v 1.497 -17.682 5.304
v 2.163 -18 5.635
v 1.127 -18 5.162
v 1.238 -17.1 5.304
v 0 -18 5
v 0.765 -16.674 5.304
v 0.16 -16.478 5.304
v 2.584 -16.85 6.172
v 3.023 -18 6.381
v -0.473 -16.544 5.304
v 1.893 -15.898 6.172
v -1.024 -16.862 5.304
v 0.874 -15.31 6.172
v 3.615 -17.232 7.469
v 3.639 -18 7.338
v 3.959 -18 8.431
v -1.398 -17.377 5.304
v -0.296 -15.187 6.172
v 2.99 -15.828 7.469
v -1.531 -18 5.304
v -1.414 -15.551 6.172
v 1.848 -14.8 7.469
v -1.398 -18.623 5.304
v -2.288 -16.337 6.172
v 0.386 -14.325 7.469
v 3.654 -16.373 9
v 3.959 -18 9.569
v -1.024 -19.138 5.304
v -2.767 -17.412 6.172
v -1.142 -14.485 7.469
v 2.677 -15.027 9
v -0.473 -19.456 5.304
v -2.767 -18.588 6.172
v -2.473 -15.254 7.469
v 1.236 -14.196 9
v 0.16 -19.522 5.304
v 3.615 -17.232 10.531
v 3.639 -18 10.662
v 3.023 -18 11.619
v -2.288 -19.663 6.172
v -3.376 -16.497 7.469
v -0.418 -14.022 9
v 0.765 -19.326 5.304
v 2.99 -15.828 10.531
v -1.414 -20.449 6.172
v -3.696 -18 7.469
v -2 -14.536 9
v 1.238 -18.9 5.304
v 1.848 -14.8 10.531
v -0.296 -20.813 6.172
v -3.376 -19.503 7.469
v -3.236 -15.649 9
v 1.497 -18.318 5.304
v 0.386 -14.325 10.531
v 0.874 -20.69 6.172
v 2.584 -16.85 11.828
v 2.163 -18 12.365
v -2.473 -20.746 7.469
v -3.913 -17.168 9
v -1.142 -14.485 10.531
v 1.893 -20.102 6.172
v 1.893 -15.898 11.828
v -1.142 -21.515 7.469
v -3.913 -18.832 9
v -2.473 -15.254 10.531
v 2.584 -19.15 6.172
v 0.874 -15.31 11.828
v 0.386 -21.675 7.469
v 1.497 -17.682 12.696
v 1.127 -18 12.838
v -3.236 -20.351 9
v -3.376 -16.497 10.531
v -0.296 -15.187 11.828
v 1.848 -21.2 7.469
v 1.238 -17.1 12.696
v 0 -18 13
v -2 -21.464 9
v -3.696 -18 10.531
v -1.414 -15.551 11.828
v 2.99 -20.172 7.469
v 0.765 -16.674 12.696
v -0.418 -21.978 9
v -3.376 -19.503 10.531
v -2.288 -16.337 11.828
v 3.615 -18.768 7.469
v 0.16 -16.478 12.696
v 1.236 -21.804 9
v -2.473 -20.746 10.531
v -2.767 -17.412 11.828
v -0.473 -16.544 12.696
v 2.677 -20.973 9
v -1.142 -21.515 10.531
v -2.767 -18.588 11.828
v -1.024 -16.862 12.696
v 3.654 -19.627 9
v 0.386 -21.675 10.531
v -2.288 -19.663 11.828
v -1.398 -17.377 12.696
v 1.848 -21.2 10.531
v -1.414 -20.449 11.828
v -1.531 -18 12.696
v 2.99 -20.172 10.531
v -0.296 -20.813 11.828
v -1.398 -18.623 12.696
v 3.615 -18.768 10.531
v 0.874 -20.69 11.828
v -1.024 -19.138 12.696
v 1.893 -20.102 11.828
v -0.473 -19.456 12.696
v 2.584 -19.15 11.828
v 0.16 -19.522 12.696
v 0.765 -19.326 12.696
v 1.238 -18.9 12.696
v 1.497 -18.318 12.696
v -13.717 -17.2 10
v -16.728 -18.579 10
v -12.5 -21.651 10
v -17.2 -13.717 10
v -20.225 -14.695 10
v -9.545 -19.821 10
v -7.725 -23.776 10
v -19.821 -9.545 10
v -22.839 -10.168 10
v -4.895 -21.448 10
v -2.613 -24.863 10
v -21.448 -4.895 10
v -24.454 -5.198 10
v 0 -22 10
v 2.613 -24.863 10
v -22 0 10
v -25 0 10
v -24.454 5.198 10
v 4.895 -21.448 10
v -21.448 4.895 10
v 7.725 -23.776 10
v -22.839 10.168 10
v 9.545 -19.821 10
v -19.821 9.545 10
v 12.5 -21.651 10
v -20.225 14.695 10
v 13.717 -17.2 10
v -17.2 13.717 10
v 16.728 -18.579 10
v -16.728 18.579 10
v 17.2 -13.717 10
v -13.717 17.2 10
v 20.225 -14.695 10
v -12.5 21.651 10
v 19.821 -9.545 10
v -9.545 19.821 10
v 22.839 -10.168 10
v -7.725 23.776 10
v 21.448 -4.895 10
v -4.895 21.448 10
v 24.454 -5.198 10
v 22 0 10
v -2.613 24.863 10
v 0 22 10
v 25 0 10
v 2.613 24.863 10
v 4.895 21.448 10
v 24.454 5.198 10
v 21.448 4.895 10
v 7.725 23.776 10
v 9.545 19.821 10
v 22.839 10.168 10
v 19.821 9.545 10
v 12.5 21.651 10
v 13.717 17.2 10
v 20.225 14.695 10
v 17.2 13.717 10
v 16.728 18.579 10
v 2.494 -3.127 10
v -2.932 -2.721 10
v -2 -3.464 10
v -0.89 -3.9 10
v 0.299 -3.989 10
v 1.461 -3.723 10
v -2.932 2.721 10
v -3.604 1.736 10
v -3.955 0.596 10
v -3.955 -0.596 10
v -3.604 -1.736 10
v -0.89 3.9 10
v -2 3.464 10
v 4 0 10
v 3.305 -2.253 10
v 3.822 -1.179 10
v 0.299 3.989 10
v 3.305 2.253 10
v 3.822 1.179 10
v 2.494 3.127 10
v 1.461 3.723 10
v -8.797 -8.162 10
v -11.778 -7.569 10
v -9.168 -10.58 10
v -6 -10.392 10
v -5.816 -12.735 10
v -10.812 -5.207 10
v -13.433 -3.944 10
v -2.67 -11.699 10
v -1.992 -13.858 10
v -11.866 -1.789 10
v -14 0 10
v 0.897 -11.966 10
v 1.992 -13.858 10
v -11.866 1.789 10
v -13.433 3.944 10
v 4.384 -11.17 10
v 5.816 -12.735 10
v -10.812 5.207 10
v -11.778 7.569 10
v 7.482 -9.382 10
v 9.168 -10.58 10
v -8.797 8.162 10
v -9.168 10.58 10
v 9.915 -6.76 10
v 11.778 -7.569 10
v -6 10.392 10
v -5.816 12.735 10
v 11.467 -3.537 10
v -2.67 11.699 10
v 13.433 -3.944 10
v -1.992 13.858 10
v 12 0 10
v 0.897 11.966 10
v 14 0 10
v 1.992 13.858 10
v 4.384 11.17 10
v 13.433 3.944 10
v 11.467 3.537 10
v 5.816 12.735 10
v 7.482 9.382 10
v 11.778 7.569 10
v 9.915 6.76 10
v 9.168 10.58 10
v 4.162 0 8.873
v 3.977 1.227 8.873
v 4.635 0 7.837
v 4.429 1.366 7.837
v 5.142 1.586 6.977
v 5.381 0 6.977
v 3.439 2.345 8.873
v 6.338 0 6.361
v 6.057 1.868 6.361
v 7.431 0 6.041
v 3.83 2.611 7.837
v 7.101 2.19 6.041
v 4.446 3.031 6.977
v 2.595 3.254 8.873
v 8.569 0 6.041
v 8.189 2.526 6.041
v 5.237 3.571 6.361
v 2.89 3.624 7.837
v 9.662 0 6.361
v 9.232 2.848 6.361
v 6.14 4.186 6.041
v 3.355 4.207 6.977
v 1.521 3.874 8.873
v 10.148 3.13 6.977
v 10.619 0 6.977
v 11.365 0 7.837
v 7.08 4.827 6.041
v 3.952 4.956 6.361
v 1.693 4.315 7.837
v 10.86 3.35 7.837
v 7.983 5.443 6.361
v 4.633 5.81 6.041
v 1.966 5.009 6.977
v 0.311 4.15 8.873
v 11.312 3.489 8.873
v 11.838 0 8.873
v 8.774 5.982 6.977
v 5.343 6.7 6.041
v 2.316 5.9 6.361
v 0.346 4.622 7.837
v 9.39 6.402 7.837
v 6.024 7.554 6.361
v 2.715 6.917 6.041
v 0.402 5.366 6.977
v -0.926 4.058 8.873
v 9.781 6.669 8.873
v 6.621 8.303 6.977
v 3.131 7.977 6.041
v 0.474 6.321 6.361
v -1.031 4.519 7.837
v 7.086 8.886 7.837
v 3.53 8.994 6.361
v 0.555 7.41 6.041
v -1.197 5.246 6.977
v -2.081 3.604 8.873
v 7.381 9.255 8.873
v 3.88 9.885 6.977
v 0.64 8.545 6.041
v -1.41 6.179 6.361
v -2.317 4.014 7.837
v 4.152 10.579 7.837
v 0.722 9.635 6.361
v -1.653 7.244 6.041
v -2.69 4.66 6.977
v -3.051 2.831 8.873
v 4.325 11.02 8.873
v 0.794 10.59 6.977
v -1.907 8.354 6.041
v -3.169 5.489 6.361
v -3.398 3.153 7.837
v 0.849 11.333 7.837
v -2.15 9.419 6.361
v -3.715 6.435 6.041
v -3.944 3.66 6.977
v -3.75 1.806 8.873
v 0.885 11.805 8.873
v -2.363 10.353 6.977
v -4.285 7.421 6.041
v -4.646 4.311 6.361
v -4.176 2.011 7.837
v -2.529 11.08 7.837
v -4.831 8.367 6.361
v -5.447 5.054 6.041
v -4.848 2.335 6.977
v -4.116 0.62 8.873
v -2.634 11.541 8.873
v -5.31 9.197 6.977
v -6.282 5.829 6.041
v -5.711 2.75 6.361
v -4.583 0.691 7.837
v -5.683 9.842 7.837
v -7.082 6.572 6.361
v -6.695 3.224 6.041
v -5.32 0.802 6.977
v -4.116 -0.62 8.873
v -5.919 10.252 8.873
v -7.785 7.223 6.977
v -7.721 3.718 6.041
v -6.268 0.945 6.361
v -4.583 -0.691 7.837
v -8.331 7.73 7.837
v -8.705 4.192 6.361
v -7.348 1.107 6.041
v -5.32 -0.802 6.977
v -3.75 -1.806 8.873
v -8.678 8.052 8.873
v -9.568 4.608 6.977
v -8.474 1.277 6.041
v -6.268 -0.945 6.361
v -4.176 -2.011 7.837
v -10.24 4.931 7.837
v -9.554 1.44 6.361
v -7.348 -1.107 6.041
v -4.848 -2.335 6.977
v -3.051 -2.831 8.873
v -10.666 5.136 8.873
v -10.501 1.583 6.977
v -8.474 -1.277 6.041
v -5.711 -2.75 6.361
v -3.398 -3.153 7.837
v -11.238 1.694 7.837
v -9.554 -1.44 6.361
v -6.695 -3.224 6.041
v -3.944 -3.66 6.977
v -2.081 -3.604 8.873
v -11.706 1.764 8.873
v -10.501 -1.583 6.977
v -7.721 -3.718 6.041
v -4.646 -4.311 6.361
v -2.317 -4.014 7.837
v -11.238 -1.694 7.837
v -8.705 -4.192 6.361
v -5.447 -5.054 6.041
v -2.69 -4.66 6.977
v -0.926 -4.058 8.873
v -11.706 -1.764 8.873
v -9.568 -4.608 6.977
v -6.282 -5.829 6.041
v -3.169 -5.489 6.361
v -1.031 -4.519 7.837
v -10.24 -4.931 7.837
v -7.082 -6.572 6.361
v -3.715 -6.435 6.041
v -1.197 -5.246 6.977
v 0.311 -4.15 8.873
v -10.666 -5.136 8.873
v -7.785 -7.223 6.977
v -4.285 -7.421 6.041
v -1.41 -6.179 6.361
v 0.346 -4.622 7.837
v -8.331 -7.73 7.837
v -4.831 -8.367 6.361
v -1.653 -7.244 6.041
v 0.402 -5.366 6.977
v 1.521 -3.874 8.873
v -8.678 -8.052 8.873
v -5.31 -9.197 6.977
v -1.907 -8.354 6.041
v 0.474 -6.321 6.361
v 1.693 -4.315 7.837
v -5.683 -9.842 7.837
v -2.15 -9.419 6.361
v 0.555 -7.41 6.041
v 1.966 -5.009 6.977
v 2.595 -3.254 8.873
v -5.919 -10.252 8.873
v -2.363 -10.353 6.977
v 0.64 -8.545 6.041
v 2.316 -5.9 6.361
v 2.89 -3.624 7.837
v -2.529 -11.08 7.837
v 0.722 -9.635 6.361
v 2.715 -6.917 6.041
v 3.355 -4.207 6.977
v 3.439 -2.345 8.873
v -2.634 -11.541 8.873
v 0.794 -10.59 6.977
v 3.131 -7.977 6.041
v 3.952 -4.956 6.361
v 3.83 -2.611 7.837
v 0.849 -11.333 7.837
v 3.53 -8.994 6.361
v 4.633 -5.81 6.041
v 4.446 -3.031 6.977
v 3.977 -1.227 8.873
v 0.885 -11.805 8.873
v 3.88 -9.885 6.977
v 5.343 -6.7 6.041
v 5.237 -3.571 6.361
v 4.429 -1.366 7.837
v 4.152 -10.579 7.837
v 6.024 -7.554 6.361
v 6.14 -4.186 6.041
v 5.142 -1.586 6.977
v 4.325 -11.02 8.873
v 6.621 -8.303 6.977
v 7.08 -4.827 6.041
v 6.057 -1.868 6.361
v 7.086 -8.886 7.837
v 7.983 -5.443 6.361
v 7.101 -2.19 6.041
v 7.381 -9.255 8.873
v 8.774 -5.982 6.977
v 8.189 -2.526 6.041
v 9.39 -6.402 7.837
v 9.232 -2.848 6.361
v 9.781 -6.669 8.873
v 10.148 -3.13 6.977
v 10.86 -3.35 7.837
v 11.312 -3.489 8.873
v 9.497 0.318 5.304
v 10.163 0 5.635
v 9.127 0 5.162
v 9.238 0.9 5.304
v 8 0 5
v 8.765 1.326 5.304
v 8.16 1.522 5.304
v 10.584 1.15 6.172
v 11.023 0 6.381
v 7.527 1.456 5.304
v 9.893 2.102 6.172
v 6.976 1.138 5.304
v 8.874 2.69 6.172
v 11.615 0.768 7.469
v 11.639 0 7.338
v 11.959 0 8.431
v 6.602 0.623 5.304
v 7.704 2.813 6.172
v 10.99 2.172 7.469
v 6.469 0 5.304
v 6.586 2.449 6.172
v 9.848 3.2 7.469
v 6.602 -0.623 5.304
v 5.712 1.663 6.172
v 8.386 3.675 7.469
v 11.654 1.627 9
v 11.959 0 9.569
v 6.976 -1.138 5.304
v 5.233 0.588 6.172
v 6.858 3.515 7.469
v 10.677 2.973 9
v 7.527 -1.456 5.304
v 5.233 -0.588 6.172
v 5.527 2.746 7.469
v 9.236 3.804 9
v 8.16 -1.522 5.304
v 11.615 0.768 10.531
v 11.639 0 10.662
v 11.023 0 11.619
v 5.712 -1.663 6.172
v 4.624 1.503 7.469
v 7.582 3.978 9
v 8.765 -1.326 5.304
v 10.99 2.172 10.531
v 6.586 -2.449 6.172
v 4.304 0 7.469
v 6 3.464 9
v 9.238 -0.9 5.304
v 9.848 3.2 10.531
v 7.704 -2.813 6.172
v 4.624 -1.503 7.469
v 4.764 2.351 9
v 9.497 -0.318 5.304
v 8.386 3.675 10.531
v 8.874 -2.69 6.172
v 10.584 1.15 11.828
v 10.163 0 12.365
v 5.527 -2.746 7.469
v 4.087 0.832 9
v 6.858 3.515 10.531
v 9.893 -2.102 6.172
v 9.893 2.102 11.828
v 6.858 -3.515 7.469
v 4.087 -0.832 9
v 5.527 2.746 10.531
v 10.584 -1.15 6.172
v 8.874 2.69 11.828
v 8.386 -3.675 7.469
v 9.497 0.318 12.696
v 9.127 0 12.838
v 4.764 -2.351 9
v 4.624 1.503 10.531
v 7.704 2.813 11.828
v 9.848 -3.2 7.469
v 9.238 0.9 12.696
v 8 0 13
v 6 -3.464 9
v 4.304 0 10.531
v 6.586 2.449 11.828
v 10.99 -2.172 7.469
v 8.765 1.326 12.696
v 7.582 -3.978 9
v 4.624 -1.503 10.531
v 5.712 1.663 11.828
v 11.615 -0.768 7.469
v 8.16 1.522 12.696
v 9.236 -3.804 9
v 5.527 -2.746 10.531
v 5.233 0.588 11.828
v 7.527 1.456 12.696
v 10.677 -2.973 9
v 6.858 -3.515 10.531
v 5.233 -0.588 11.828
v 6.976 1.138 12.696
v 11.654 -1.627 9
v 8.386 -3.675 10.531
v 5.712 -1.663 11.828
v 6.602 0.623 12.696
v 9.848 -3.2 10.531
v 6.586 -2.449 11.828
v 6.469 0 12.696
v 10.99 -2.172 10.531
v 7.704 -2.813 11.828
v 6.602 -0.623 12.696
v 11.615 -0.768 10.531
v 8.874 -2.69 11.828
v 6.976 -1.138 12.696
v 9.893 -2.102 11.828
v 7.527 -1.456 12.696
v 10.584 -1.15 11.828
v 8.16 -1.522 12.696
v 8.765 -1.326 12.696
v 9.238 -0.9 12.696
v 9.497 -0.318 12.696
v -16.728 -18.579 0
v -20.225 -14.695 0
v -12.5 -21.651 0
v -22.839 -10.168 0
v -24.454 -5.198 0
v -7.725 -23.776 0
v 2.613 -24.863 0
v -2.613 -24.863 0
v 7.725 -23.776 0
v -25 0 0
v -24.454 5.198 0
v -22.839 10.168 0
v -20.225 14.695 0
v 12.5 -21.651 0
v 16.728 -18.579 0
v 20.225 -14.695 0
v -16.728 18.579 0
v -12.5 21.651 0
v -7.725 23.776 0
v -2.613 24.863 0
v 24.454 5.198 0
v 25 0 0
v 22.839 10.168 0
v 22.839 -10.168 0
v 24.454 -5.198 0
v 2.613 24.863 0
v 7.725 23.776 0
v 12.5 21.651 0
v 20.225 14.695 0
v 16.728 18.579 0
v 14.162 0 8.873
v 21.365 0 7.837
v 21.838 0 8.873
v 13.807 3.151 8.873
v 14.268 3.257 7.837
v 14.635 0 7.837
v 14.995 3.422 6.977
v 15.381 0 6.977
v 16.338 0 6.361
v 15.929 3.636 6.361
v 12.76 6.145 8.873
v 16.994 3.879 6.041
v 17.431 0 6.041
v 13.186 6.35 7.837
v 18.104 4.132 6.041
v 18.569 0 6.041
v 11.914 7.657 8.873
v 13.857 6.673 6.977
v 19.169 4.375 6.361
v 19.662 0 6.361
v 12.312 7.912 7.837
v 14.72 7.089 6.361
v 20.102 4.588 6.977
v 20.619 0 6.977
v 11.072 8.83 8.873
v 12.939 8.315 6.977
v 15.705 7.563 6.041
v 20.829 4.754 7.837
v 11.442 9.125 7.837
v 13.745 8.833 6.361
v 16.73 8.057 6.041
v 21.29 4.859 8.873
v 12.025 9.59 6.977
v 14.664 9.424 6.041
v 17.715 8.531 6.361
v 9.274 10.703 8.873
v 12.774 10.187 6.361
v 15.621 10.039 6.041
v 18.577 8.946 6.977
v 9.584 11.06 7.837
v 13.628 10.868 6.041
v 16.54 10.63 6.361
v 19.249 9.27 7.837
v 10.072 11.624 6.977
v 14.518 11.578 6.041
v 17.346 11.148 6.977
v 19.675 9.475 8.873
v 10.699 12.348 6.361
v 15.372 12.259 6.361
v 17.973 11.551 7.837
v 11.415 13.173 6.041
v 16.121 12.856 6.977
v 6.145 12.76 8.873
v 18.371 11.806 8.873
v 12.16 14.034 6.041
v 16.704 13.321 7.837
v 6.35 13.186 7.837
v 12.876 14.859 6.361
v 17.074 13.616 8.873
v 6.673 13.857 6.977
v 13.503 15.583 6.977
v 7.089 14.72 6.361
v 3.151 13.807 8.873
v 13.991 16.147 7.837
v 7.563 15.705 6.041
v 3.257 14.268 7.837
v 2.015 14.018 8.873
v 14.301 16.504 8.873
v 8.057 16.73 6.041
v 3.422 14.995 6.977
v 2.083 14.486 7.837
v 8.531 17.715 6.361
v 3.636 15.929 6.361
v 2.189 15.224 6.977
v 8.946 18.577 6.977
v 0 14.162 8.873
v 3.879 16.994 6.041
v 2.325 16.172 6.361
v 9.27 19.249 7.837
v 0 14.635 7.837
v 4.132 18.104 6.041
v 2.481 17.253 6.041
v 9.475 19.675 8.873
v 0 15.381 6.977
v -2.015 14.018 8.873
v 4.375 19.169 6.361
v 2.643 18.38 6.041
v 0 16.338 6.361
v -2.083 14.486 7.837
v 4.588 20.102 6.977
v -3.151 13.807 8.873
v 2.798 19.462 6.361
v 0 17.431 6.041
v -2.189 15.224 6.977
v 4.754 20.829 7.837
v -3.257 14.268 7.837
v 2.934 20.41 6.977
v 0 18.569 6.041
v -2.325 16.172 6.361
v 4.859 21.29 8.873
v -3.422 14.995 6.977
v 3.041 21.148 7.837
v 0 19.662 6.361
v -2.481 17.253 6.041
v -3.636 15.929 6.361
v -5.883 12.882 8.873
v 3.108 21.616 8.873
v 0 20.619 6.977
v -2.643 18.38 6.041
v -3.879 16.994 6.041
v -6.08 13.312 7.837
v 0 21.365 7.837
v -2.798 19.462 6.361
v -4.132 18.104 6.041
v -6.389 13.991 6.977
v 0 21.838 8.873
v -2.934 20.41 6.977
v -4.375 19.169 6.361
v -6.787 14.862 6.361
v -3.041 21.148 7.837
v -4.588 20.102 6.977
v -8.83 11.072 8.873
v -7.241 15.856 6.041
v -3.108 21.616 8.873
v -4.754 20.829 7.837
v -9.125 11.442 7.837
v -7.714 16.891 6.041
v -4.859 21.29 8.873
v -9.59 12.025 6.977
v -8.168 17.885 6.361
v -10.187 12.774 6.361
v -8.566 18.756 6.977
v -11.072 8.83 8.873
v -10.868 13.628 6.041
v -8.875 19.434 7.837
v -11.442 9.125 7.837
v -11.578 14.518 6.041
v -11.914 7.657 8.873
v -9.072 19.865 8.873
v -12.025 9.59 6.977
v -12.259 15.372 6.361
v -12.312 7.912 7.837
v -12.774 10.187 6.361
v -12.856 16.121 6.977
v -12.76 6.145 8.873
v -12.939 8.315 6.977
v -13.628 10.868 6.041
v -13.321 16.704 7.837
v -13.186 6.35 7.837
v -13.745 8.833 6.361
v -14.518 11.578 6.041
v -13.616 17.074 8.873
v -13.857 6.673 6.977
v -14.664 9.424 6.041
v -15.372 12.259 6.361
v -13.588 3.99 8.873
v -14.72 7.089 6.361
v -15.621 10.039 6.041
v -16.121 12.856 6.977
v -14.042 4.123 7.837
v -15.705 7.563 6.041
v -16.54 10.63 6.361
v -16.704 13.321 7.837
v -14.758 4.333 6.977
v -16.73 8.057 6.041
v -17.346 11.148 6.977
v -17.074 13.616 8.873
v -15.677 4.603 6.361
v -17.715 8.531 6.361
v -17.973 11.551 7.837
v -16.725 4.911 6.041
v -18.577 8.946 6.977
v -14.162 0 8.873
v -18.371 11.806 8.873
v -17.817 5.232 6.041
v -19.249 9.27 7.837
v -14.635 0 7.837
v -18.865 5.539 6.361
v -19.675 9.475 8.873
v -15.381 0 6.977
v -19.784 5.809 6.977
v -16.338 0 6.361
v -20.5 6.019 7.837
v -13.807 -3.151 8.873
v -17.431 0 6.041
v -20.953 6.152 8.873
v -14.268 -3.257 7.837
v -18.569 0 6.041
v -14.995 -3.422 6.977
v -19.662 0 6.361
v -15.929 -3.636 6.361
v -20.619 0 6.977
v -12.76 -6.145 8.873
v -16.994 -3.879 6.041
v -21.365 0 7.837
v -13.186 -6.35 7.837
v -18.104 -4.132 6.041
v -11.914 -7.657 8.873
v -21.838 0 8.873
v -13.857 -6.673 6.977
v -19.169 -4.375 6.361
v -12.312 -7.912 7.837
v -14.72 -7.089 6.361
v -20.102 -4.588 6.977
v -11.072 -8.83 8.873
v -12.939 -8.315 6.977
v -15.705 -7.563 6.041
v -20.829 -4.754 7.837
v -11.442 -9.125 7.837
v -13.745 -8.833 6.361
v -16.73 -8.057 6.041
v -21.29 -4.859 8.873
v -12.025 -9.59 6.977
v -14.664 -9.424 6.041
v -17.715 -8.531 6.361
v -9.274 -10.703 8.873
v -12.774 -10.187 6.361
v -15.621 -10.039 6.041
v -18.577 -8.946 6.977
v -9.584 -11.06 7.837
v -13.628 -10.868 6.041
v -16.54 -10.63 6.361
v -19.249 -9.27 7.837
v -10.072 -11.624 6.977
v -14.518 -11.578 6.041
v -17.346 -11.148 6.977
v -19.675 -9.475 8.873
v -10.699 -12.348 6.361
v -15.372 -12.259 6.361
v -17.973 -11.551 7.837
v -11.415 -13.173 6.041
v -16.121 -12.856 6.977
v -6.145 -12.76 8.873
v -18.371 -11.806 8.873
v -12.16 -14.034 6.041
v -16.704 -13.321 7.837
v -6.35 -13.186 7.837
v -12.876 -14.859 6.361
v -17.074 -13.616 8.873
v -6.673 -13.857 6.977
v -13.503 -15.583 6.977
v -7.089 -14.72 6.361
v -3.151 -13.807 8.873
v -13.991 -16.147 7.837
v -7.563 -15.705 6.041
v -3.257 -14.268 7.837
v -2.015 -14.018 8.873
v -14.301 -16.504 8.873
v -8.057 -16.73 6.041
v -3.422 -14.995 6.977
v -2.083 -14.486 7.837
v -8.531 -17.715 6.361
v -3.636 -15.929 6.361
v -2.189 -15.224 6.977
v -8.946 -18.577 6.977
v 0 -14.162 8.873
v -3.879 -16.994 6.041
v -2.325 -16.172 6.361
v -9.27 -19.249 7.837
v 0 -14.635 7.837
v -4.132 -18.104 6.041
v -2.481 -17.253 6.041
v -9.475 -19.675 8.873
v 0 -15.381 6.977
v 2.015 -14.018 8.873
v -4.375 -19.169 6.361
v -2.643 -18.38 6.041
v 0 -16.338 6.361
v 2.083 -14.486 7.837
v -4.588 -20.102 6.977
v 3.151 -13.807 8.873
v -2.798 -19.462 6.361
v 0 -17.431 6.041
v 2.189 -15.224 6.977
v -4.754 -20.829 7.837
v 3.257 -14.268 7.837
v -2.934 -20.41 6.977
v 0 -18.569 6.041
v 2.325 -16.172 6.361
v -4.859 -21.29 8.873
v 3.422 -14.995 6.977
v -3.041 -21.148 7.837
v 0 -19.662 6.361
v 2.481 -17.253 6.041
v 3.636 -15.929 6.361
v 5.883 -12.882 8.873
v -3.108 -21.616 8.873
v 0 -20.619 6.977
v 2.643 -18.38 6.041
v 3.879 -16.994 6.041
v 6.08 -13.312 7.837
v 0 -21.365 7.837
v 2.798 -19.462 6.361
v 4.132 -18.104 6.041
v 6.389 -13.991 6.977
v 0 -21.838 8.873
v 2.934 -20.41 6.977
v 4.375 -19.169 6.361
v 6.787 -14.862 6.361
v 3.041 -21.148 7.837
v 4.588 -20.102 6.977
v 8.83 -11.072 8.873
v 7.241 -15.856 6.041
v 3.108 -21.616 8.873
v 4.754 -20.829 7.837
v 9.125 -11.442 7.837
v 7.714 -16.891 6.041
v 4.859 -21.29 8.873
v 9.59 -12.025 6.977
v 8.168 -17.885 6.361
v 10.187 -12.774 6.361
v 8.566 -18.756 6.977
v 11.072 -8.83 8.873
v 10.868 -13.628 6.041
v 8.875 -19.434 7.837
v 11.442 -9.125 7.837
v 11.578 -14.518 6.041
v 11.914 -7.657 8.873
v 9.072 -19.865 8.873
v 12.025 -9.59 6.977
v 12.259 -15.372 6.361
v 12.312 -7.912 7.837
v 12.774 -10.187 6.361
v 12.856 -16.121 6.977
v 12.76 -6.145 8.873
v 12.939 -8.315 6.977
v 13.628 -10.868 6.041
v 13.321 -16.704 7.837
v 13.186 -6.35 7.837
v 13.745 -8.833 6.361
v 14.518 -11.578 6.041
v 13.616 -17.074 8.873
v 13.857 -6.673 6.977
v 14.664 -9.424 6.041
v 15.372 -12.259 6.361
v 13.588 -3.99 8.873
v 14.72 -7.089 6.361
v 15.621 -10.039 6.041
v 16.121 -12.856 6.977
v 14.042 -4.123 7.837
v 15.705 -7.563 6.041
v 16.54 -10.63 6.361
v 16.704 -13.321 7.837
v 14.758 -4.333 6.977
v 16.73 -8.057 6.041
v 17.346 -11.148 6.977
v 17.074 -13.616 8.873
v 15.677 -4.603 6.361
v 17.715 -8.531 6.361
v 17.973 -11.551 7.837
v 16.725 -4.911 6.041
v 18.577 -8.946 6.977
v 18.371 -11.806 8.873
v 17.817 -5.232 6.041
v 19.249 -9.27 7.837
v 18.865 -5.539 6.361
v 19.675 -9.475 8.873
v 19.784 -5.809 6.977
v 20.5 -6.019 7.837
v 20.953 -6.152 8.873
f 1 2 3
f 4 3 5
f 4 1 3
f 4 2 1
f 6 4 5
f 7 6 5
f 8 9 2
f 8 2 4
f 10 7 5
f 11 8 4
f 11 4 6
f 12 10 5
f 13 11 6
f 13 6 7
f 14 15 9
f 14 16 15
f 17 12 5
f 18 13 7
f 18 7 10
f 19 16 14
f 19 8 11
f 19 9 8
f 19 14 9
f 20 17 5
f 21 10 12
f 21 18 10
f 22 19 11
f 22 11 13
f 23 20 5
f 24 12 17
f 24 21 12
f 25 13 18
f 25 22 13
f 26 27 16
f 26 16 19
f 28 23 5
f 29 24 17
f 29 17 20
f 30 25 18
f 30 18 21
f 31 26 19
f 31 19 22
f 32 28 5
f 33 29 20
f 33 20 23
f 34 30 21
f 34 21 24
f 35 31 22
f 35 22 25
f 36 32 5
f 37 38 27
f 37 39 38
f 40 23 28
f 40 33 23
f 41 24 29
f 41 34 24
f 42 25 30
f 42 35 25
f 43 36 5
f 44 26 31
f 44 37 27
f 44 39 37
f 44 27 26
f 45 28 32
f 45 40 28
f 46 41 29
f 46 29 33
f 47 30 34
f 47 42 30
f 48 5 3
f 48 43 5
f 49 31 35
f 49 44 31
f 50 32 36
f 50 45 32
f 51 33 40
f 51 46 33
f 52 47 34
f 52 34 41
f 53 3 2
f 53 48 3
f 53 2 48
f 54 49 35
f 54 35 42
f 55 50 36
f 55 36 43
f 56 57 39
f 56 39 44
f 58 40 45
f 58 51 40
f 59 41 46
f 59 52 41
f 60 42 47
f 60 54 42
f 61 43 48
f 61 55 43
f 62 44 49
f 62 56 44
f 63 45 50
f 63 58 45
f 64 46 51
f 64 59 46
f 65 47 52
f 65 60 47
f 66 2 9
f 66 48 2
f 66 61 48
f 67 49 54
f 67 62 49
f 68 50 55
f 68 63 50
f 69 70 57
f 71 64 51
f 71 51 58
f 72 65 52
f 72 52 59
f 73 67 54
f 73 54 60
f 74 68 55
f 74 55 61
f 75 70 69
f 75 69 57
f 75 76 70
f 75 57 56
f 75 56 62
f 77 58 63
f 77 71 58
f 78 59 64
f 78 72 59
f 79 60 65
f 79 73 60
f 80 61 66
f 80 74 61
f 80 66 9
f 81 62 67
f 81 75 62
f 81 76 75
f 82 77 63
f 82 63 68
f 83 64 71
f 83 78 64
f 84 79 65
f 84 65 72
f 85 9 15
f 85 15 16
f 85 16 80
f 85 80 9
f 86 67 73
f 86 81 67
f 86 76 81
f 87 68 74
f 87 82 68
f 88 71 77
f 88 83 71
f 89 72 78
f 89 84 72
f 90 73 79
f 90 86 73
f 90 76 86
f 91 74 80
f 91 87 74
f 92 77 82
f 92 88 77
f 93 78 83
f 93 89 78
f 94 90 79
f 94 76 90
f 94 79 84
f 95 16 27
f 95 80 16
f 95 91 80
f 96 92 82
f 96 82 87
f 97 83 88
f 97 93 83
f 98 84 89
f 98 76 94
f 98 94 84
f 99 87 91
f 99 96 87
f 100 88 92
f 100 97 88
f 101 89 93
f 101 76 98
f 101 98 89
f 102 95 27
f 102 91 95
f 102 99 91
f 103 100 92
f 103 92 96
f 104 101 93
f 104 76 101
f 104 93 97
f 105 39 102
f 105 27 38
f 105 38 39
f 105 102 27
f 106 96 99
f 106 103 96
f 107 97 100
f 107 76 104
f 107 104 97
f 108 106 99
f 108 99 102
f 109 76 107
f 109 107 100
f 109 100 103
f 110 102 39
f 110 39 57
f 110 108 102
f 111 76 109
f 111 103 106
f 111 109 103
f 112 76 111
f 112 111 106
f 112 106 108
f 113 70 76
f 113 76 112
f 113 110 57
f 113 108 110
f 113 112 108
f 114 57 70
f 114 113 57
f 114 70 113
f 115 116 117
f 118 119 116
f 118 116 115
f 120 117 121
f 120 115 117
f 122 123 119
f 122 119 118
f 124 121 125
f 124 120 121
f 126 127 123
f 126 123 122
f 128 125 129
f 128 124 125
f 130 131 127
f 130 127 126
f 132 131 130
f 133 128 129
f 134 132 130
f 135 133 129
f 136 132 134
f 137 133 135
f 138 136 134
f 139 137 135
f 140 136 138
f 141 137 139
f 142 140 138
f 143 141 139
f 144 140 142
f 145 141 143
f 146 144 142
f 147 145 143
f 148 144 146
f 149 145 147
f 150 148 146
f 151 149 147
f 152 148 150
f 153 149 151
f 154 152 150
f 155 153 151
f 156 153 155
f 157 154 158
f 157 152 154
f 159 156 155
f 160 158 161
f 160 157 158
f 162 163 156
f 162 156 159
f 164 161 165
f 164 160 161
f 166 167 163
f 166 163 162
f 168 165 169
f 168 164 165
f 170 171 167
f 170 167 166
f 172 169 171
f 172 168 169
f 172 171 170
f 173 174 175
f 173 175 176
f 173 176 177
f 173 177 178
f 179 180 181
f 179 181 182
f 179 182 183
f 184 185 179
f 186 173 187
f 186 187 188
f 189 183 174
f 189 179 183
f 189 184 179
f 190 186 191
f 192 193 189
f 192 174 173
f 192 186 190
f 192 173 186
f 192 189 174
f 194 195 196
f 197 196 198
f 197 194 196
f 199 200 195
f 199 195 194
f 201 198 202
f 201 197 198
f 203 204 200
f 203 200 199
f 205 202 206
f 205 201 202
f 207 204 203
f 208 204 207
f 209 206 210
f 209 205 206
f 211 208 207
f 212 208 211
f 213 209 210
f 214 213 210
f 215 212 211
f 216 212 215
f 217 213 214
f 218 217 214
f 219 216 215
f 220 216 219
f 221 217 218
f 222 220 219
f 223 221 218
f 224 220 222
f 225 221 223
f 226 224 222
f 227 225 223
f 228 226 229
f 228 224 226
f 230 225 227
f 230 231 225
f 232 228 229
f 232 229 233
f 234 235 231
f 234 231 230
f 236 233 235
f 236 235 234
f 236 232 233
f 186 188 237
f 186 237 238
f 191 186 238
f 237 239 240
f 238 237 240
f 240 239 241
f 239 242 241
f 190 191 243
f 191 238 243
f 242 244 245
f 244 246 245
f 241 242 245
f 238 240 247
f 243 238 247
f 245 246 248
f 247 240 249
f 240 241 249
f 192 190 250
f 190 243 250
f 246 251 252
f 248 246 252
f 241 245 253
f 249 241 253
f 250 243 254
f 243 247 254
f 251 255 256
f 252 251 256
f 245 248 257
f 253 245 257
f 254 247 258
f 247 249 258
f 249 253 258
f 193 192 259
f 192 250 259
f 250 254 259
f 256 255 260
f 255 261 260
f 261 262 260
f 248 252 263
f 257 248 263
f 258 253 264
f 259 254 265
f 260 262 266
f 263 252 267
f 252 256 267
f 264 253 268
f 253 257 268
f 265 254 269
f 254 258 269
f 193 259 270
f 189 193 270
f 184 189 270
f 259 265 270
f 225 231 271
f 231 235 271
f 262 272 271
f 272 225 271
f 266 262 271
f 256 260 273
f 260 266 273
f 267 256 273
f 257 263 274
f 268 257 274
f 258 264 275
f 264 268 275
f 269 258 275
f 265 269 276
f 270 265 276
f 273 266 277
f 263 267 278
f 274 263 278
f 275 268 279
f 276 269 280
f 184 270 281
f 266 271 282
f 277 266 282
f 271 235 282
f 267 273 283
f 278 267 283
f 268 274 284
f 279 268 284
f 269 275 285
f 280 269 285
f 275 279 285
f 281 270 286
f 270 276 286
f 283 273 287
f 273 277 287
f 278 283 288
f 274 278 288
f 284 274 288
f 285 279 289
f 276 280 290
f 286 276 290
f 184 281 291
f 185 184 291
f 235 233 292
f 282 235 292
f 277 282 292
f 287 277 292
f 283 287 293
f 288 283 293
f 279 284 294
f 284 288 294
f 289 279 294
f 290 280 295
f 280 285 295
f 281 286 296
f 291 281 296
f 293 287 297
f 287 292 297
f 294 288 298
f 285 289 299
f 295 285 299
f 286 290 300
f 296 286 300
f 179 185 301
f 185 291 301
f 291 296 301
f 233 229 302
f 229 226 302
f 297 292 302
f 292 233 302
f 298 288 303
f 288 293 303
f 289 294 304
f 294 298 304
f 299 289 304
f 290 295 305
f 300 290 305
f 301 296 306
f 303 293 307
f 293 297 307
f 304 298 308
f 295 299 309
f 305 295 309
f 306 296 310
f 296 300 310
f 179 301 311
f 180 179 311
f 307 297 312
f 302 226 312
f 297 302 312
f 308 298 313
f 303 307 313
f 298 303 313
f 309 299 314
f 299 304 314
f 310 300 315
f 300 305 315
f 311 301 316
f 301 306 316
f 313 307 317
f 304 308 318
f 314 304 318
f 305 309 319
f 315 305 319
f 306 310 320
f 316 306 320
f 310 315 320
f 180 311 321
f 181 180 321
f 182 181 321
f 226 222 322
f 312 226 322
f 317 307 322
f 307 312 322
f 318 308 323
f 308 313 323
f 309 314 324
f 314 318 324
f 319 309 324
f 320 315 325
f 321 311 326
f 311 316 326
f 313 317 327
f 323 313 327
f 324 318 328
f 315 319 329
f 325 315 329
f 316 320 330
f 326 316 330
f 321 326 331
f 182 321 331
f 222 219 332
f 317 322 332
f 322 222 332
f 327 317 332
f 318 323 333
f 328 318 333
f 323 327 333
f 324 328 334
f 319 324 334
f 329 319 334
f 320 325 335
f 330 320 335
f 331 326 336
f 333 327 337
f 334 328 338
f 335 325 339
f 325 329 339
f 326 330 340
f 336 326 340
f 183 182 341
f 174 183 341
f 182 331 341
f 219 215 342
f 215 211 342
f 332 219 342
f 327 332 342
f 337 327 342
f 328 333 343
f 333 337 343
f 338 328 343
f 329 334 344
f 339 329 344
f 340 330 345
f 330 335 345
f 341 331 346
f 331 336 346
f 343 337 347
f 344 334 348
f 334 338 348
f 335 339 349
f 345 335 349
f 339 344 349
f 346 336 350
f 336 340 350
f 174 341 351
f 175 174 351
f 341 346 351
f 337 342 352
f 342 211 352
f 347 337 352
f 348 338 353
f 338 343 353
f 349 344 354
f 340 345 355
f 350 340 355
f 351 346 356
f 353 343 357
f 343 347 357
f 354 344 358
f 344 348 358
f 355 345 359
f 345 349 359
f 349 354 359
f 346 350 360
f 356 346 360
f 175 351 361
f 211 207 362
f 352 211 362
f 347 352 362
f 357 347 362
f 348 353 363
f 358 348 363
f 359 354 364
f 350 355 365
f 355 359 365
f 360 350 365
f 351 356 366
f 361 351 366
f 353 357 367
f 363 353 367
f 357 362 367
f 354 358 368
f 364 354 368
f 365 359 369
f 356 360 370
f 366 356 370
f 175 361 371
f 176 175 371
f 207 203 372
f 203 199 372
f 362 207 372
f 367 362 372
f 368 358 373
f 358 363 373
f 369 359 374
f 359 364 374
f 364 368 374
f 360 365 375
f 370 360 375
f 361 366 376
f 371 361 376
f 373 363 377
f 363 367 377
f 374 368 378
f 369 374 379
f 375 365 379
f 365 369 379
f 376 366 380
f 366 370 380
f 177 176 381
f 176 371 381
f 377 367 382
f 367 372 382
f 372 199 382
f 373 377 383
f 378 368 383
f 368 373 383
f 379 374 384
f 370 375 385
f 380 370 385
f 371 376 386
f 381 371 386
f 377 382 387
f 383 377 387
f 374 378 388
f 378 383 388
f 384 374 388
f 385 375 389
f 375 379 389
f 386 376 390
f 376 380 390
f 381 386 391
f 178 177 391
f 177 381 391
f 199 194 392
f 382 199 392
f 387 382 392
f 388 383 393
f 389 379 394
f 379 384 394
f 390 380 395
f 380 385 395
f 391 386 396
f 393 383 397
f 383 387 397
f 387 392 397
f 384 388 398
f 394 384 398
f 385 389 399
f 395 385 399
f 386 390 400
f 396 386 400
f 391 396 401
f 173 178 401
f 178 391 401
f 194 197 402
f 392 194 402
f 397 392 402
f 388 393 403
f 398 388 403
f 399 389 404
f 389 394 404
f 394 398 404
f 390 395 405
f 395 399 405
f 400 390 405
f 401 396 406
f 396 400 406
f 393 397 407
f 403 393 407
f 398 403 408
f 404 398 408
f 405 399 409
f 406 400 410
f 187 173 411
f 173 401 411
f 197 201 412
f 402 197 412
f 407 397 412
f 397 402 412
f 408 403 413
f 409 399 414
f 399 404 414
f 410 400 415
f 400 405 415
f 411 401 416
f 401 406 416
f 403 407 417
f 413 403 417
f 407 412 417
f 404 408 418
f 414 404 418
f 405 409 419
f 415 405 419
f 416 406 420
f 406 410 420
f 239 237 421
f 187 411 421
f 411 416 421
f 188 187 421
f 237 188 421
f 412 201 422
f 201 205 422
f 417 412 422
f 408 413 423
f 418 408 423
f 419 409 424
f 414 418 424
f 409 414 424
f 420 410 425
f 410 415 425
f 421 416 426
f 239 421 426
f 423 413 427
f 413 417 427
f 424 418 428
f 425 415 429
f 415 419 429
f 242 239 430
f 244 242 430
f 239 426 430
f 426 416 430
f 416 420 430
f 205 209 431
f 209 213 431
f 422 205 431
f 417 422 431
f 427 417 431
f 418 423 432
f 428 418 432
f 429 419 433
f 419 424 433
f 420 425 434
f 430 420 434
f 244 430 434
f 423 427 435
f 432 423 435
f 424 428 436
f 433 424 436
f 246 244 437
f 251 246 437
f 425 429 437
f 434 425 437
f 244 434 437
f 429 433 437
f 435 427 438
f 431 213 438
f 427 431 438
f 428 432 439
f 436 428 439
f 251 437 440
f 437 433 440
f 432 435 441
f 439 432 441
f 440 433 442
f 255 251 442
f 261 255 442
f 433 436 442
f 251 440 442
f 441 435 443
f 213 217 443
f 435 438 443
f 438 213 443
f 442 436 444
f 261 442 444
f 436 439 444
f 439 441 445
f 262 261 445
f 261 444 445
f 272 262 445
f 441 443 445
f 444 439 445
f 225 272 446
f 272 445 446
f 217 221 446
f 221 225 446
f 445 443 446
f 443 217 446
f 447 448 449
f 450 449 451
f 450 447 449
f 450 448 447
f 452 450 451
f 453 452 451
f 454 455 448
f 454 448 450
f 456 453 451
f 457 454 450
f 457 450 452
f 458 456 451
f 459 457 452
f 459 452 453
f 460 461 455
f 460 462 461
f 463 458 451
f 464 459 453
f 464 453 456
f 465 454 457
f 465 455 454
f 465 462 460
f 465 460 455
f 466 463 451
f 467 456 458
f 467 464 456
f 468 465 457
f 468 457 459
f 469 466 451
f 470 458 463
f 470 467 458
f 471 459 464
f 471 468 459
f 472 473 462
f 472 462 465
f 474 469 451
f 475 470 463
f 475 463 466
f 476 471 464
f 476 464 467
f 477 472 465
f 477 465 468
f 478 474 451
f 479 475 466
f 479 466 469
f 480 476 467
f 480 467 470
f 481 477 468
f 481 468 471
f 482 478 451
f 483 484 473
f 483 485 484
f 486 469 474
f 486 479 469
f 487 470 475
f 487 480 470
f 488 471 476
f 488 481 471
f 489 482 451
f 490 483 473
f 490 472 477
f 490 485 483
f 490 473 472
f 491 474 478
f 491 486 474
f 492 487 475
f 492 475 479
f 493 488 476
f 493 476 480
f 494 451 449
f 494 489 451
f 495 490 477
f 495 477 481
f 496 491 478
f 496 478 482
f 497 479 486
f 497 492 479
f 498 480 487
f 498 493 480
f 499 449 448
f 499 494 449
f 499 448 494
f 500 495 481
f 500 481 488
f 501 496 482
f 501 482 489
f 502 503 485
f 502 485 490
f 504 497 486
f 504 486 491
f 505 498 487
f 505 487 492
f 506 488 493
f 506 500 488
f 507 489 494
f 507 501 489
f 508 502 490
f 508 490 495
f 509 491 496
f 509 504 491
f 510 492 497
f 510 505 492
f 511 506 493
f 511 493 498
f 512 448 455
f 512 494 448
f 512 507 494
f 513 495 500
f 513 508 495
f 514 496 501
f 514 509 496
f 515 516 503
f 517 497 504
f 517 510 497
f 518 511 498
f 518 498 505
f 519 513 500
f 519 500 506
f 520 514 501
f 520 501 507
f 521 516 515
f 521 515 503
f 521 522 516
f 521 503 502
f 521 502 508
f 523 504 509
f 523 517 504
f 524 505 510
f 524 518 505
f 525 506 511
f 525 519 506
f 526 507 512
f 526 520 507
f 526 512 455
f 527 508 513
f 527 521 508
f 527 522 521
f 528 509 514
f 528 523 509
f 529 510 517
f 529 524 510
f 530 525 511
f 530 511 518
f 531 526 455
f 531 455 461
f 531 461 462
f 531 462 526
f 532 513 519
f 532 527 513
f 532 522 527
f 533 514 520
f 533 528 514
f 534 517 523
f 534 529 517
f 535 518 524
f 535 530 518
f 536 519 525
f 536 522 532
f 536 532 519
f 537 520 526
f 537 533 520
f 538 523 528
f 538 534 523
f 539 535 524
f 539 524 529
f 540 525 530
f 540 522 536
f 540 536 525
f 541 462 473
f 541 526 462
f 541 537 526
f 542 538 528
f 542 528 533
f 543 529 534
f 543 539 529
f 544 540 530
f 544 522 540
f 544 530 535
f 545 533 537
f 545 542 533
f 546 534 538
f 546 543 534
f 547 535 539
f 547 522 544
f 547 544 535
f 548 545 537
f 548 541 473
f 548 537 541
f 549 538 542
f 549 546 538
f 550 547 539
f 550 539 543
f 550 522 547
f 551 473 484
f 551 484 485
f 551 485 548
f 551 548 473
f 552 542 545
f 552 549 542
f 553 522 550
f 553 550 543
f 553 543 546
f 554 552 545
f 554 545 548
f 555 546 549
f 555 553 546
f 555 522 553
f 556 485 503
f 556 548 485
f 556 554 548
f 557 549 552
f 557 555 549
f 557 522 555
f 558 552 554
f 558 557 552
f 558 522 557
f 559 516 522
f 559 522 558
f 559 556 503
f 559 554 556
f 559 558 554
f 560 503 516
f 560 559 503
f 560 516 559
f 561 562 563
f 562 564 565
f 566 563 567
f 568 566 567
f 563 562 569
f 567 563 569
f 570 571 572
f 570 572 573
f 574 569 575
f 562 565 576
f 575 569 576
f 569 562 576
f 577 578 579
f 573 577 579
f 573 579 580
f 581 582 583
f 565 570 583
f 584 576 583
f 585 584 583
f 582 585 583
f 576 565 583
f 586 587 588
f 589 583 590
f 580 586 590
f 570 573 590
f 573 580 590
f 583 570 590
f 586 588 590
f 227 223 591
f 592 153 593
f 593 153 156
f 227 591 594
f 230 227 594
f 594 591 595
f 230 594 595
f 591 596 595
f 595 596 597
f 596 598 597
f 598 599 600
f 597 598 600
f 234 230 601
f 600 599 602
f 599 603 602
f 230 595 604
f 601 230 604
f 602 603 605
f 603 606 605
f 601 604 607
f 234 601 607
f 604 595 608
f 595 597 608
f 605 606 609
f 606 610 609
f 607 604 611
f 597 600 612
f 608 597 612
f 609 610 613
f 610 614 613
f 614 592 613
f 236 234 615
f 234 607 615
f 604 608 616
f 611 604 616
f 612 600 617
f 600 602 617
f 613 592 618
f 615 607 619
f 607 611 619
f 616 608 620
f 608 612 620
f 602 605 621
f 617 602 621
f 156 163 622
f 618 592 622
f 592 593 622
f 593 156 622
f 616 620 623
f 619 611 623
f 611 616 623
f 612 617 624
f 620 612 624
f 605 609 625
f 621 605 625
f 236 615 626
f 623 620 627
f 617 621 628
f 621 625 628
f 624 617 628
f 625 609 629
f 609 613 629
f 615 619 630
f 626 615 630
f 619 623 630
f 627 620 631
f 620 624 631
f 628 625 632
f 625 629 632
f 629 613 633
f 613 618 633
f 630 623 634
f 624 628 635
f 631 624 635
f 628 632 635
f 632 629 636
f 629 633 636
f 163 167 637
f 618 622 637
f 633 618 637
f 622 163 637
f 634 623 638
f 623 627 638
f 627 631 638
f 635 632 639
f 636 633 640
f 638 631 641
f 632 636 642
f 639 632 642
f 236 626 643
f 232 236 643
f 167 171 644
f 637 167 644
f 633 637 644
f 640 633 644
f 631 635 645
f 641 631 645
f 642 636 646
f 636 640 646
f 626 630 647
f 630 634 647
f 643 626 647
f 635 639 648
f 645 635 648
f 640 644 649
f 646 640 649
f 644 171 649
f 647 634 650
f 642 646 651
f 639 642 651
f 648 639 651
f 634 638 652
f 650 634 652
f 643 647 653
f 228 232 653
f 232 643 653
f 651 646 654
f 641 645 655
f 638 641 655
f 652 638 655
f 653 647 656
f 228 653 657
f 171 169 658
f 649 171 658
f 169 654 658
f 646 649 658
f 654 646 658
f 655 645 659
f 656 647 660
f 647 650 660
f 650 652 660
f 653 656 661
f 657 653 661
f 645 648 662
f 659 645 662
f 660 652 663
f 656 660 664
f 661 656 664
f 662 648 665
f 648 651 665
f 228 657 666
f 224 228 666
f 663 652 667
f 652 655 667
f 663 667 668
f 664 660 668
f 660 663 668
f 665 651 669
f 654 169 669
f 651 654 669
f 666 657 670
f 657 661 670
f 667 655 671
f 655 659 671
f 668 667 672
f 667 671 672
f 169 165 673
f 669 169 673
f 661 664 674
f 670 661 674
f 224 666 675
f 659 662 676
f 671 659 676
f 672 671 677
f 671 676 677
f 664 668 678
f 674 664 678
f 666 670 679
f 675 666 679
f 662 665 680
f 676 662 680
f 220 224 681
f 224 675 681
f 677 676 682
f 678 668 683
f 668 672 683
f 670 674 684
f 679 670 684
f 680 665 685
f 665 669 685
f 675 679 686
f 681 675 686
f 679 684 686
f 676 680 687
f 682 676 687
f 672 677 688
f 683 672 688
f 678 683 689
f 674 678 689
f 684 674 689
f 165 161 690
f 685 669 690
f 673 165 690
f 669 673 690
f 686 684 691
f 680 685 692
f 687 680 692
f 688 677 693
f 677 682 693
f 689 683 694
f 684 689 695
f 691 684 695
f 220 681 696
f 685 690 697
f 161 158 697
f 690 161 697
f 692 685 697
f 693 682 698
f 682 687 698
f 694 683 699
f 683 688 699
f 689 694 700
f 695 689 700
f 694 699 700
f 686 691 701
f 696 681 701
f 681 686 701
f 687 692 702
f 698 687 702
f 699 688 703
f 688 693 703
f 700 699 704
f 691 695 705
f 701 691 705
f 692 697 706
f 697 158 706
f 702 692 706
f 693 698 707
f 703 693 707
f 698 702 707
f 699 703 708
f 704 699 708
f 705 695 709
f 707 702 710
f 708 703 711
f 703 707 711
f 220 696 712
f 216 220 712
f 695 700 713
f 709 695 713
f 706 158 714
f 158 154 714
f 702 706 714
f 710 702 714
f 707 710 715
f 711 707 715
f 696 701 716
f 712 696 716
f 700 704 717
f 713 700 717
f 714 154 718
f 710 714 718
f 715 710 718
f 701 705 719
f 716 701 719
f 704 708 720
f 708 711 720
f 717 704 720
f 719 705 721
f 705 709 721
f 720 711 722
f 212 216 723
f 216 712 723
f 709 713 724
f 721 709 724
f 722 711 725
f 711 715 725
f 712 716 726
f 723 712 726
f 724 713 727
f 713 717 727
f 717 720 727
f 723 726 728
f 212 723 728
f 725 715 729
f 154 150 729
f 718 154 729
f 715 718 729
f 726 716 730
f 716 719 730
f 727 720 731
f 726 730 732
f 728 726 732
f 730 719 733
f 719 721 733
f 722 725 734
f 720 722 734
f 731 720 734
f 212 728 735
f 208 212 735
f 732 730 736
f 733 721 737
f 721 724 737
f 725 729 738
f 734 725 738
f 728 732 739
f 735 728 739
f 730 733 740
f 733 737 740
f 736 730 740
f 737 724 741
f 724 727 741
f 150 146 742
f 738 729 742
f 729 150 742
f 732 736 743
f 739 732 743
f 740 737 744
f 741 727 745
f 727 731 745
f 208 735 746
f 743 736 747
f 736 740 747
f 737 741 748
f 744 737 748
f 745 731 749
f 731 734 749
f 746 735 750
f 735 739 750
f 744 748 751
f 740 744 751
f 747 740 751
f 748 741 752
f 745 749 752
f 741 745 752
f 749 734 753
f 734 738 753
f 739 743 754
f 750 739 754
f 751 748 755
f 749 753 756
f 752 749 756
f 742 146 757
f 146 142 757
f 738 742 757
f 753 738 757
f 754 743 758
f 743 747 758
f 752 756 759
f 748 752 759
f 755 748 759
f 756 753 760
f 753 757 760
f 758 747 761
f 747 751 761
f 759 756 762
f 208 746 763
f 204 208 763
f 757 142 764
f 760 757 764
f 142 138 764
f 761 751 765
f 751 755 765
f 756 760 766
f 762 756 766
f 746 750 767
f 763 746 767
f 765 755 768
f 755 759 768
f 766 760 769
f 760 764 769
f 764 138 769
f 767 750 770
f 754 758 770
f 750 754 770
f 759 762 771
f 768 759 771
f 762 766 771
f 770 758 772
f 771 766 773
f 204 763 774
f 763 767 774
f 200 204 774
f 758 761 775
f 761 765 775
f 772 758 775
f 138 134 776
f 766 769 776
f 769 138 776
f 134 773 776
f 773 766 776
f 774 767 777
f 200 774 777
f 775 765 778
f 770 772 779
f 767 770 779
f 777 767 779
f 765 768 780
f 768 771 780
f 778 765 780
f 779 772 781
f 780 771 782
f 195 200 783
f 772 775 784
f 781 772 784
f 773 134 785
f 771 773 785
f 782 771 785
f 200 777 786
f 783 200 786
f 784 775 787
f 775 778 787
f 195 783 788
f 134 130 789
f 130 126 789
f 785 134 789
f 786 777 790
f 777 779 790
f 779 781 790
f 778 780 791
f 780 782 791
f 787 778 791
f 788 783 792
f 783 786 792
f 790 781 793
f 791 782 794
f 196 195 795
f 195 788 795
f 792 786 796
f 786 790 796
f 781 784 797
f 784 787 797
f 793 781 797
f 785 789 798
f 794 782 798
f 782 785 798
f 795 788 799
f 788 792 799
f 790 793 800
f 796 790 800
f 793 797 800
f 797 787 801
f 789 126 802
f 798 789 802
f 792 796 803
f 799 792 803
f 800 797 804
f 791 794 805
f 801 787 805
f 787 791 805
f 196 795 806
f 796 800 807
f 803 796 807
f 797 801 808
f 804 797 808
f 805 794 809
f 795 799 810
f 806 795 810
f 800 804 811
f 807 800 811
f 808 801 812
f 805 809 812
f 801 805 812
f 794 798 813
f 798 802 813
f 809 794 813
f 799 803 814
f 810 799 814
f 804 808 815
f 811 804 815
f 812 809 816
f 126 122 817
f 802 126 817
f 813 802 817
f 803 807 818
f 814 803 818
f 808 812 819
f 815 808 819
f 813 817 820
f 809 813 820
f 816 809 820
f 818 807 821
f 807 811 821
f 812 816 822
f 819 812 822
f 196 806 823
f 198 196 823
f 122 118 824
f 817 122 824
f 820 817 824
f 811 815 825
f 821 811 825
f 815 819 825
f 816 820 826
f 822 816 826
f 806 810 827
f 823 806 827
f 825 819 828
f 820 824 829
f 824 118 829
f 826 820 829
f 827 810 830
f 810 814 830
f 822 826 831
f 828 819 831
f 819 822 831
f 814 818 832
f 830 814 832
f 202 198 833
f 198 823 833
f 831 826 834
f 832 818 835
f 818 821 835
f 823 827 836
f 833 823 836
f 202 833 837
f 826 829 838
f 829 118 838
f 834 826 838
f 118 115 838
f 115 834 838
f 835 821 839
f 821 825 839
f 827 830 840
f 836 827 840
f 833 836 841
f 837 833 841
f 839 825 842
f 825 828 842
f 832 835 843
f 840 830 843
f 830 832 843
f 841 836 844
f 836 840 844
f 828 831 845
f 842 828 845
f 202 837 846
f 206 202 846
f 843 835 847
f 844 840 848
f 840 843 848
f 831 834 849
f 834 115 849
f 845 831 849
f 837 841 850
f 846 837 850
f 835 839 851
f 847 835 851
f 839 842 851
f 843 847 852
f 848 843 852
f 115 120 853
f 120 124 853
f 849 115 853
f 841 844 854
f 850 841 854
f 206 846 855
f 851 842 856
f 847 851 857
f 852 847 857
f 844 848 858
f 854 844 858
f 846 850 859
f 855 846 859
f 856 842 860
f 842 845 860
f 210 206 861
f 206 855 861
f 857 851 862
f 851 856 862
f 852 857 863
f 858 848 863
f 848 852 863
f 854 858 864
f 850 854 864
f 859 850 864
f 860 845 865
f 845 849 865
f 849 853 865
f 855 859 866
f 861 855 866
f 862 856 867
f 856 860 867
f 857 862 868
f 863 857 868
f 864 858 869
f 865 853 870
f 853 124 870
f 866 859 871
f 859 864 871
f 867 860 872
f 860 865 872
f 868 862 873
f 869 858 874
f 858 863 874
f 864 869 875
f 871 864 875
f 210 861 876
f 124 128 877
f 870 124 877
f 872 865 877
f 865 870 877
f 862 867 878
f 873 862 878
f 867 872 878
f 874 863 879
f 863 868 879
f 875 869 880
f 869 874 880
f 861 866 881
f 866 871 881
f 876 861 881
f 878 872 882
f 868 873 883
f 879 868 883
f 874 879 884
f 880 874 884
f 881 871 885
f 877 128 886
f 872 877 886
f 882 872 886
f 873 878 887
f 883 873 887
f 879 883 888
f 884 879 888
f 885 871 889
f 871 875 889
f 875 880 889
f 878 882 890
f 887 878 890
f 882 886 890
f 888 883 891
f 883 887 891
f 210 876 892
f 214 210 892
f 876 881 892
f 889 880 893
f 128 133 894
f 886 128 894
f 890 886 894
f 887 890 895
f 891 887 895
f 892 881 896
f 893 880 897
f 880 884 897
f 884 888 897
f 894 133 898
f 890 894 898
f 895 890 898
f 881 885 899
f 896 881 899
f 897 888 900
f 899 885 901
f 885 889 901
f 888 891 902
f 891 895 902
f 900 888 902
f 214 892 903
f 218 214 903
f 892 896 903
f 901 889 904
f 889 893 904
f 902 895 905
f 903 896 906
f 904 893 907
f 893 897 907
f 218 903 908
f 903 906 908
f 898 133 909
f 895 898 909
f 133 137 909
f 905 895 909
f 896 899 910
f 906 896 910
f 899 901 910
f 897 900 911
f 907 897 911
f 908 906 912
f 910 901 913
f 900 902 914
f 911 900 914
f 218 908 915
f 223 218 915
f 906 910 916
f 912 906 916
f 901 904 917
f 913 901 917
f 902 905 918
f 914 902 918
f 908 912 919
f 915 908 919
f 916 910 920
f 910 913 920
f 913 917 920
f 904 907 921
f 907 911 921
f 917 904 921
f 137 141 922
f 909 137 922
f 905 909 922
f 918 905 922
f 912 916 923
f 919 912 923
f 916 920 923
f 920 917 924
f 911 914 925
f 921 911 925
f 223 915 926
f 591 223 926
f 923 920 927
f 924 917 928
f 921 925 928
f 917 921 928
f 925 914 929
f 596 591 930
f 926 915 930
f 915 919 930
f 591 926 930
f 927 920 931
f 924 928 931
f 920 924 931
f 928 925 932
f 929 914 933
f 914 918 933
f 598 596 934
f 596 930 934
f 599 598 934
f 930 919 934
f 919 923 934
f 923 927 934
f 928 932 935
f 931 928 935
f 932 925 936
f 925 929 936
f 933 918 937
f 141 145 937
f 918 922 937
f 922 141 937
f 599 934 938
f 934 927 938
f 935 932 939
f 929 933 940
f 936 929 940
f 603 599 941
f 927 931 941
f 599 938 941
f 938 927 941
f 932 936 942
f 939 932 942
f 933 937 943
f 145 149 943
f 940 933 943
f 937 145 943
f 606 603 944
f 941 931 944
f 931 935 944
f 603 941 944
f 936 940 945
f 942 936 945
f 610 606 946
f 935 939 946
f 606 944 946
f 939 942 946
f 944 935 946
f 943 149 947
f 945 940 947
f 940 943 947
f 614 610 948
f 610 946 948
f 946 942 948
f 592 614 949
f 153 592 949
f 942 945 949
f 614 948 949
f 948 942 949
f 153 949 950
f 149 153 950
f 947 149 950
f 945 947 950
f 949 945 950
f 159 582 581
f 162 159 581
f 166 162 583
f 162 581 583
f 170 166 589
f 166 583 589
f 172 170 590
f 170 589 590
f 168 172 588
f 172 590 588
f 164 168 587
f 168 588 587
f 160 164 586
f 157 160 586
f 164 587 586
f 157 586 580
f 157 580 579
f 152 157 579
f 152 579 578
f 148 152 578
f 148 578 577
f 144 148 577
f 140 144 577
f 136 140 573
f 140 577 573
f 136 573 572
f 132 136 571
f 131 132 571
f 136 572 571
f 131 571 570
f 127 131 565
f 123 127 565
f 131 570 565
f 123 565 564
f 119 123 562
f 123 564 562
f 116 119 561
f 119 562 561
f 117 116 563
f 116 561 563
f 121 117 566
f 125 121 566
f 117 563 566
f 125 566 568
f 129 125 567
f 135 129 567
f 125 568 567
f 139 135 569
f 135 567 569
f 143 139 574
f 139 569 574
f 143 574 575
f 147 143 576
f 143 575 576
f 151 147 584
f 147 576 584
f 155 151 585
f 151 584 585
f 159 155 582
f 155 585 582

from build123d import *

# Parameters (mm, degrees)
TORUS001_R     = 4
TORUS_R        = 4
CYLINDER_R     = 25
CYLINDER_DEPTH = 10


with BuildPart() as torus001:
    # Torus001 → Torus001 (revolve)
    with BuildSketch(Plane(origin=(0, 0, 10), x_dir=(1, 0, 0), z_dir=(0, -1, 0))):
        with Locations((18, 0)):
            Circle(TORUS001_R)
    revolve(axis=Axis((0, 0, 10), (0, 0, 1)))


with BuildPart() as torus:
    # Torus → Torus (revolve)
    with BuildSketch(Plane(origin=(0, 0, 10), x_dir=(1, 0, 0), z_dir=(0, -1, 0))):
        with Locations((8, 0)):
            Circle(TORUS_R)
    revolve(axis=Axis((0, 0, 10), (0, 0, 1)))


with BuildPart() as cut001:
    # Cylinder → Cylinder (new body)
    with BuildSketch(Plane.XY):
        Circle(CYLINDER_R)
    extrude(amount=CYLINDER_DEPTH)

    # Cut: cut Torus
    add(torus.part, mode=Mode.SUBTRACT)

    # Cut001: cut Torus001
    add(torus001.part, mode=Mode.SUBTRACT)


with BuildPart() as sphere:
    # Sphere → Sphere (revolve)
    with BuildSketch(Plane(origin=(8, 0, 9), x_dir=(1, 0, 0), z_dir=(0, -1, 0))):
        with BuildLine():
            ThreePointArc((0, -4), (4, 0), (0, 4))
            Line((0, 4), (0, -4))
        make_face()
    revolve(axis=Axis((8, 0, 9), (0, 0, 1)))


with BuildPart() as sphere001:
    # Sphere001 → Sphere001 (revolve)
    with BuildSketch(Plane(origin=(0, -18, 9), x_dir=(1, 0, 0), z_dir=(0, -1, 0))):
        with BuildLine():
            ThreePointArc((0, -4), (4, 0), (0, 4))
            Line((0, 4), (0, -4))
        make_face()
    revolve(axis=Axis((0, -18, 9), (0, 0, 1)))


solid = Compound([cut001.part, sphere.part, sphere001.part])
